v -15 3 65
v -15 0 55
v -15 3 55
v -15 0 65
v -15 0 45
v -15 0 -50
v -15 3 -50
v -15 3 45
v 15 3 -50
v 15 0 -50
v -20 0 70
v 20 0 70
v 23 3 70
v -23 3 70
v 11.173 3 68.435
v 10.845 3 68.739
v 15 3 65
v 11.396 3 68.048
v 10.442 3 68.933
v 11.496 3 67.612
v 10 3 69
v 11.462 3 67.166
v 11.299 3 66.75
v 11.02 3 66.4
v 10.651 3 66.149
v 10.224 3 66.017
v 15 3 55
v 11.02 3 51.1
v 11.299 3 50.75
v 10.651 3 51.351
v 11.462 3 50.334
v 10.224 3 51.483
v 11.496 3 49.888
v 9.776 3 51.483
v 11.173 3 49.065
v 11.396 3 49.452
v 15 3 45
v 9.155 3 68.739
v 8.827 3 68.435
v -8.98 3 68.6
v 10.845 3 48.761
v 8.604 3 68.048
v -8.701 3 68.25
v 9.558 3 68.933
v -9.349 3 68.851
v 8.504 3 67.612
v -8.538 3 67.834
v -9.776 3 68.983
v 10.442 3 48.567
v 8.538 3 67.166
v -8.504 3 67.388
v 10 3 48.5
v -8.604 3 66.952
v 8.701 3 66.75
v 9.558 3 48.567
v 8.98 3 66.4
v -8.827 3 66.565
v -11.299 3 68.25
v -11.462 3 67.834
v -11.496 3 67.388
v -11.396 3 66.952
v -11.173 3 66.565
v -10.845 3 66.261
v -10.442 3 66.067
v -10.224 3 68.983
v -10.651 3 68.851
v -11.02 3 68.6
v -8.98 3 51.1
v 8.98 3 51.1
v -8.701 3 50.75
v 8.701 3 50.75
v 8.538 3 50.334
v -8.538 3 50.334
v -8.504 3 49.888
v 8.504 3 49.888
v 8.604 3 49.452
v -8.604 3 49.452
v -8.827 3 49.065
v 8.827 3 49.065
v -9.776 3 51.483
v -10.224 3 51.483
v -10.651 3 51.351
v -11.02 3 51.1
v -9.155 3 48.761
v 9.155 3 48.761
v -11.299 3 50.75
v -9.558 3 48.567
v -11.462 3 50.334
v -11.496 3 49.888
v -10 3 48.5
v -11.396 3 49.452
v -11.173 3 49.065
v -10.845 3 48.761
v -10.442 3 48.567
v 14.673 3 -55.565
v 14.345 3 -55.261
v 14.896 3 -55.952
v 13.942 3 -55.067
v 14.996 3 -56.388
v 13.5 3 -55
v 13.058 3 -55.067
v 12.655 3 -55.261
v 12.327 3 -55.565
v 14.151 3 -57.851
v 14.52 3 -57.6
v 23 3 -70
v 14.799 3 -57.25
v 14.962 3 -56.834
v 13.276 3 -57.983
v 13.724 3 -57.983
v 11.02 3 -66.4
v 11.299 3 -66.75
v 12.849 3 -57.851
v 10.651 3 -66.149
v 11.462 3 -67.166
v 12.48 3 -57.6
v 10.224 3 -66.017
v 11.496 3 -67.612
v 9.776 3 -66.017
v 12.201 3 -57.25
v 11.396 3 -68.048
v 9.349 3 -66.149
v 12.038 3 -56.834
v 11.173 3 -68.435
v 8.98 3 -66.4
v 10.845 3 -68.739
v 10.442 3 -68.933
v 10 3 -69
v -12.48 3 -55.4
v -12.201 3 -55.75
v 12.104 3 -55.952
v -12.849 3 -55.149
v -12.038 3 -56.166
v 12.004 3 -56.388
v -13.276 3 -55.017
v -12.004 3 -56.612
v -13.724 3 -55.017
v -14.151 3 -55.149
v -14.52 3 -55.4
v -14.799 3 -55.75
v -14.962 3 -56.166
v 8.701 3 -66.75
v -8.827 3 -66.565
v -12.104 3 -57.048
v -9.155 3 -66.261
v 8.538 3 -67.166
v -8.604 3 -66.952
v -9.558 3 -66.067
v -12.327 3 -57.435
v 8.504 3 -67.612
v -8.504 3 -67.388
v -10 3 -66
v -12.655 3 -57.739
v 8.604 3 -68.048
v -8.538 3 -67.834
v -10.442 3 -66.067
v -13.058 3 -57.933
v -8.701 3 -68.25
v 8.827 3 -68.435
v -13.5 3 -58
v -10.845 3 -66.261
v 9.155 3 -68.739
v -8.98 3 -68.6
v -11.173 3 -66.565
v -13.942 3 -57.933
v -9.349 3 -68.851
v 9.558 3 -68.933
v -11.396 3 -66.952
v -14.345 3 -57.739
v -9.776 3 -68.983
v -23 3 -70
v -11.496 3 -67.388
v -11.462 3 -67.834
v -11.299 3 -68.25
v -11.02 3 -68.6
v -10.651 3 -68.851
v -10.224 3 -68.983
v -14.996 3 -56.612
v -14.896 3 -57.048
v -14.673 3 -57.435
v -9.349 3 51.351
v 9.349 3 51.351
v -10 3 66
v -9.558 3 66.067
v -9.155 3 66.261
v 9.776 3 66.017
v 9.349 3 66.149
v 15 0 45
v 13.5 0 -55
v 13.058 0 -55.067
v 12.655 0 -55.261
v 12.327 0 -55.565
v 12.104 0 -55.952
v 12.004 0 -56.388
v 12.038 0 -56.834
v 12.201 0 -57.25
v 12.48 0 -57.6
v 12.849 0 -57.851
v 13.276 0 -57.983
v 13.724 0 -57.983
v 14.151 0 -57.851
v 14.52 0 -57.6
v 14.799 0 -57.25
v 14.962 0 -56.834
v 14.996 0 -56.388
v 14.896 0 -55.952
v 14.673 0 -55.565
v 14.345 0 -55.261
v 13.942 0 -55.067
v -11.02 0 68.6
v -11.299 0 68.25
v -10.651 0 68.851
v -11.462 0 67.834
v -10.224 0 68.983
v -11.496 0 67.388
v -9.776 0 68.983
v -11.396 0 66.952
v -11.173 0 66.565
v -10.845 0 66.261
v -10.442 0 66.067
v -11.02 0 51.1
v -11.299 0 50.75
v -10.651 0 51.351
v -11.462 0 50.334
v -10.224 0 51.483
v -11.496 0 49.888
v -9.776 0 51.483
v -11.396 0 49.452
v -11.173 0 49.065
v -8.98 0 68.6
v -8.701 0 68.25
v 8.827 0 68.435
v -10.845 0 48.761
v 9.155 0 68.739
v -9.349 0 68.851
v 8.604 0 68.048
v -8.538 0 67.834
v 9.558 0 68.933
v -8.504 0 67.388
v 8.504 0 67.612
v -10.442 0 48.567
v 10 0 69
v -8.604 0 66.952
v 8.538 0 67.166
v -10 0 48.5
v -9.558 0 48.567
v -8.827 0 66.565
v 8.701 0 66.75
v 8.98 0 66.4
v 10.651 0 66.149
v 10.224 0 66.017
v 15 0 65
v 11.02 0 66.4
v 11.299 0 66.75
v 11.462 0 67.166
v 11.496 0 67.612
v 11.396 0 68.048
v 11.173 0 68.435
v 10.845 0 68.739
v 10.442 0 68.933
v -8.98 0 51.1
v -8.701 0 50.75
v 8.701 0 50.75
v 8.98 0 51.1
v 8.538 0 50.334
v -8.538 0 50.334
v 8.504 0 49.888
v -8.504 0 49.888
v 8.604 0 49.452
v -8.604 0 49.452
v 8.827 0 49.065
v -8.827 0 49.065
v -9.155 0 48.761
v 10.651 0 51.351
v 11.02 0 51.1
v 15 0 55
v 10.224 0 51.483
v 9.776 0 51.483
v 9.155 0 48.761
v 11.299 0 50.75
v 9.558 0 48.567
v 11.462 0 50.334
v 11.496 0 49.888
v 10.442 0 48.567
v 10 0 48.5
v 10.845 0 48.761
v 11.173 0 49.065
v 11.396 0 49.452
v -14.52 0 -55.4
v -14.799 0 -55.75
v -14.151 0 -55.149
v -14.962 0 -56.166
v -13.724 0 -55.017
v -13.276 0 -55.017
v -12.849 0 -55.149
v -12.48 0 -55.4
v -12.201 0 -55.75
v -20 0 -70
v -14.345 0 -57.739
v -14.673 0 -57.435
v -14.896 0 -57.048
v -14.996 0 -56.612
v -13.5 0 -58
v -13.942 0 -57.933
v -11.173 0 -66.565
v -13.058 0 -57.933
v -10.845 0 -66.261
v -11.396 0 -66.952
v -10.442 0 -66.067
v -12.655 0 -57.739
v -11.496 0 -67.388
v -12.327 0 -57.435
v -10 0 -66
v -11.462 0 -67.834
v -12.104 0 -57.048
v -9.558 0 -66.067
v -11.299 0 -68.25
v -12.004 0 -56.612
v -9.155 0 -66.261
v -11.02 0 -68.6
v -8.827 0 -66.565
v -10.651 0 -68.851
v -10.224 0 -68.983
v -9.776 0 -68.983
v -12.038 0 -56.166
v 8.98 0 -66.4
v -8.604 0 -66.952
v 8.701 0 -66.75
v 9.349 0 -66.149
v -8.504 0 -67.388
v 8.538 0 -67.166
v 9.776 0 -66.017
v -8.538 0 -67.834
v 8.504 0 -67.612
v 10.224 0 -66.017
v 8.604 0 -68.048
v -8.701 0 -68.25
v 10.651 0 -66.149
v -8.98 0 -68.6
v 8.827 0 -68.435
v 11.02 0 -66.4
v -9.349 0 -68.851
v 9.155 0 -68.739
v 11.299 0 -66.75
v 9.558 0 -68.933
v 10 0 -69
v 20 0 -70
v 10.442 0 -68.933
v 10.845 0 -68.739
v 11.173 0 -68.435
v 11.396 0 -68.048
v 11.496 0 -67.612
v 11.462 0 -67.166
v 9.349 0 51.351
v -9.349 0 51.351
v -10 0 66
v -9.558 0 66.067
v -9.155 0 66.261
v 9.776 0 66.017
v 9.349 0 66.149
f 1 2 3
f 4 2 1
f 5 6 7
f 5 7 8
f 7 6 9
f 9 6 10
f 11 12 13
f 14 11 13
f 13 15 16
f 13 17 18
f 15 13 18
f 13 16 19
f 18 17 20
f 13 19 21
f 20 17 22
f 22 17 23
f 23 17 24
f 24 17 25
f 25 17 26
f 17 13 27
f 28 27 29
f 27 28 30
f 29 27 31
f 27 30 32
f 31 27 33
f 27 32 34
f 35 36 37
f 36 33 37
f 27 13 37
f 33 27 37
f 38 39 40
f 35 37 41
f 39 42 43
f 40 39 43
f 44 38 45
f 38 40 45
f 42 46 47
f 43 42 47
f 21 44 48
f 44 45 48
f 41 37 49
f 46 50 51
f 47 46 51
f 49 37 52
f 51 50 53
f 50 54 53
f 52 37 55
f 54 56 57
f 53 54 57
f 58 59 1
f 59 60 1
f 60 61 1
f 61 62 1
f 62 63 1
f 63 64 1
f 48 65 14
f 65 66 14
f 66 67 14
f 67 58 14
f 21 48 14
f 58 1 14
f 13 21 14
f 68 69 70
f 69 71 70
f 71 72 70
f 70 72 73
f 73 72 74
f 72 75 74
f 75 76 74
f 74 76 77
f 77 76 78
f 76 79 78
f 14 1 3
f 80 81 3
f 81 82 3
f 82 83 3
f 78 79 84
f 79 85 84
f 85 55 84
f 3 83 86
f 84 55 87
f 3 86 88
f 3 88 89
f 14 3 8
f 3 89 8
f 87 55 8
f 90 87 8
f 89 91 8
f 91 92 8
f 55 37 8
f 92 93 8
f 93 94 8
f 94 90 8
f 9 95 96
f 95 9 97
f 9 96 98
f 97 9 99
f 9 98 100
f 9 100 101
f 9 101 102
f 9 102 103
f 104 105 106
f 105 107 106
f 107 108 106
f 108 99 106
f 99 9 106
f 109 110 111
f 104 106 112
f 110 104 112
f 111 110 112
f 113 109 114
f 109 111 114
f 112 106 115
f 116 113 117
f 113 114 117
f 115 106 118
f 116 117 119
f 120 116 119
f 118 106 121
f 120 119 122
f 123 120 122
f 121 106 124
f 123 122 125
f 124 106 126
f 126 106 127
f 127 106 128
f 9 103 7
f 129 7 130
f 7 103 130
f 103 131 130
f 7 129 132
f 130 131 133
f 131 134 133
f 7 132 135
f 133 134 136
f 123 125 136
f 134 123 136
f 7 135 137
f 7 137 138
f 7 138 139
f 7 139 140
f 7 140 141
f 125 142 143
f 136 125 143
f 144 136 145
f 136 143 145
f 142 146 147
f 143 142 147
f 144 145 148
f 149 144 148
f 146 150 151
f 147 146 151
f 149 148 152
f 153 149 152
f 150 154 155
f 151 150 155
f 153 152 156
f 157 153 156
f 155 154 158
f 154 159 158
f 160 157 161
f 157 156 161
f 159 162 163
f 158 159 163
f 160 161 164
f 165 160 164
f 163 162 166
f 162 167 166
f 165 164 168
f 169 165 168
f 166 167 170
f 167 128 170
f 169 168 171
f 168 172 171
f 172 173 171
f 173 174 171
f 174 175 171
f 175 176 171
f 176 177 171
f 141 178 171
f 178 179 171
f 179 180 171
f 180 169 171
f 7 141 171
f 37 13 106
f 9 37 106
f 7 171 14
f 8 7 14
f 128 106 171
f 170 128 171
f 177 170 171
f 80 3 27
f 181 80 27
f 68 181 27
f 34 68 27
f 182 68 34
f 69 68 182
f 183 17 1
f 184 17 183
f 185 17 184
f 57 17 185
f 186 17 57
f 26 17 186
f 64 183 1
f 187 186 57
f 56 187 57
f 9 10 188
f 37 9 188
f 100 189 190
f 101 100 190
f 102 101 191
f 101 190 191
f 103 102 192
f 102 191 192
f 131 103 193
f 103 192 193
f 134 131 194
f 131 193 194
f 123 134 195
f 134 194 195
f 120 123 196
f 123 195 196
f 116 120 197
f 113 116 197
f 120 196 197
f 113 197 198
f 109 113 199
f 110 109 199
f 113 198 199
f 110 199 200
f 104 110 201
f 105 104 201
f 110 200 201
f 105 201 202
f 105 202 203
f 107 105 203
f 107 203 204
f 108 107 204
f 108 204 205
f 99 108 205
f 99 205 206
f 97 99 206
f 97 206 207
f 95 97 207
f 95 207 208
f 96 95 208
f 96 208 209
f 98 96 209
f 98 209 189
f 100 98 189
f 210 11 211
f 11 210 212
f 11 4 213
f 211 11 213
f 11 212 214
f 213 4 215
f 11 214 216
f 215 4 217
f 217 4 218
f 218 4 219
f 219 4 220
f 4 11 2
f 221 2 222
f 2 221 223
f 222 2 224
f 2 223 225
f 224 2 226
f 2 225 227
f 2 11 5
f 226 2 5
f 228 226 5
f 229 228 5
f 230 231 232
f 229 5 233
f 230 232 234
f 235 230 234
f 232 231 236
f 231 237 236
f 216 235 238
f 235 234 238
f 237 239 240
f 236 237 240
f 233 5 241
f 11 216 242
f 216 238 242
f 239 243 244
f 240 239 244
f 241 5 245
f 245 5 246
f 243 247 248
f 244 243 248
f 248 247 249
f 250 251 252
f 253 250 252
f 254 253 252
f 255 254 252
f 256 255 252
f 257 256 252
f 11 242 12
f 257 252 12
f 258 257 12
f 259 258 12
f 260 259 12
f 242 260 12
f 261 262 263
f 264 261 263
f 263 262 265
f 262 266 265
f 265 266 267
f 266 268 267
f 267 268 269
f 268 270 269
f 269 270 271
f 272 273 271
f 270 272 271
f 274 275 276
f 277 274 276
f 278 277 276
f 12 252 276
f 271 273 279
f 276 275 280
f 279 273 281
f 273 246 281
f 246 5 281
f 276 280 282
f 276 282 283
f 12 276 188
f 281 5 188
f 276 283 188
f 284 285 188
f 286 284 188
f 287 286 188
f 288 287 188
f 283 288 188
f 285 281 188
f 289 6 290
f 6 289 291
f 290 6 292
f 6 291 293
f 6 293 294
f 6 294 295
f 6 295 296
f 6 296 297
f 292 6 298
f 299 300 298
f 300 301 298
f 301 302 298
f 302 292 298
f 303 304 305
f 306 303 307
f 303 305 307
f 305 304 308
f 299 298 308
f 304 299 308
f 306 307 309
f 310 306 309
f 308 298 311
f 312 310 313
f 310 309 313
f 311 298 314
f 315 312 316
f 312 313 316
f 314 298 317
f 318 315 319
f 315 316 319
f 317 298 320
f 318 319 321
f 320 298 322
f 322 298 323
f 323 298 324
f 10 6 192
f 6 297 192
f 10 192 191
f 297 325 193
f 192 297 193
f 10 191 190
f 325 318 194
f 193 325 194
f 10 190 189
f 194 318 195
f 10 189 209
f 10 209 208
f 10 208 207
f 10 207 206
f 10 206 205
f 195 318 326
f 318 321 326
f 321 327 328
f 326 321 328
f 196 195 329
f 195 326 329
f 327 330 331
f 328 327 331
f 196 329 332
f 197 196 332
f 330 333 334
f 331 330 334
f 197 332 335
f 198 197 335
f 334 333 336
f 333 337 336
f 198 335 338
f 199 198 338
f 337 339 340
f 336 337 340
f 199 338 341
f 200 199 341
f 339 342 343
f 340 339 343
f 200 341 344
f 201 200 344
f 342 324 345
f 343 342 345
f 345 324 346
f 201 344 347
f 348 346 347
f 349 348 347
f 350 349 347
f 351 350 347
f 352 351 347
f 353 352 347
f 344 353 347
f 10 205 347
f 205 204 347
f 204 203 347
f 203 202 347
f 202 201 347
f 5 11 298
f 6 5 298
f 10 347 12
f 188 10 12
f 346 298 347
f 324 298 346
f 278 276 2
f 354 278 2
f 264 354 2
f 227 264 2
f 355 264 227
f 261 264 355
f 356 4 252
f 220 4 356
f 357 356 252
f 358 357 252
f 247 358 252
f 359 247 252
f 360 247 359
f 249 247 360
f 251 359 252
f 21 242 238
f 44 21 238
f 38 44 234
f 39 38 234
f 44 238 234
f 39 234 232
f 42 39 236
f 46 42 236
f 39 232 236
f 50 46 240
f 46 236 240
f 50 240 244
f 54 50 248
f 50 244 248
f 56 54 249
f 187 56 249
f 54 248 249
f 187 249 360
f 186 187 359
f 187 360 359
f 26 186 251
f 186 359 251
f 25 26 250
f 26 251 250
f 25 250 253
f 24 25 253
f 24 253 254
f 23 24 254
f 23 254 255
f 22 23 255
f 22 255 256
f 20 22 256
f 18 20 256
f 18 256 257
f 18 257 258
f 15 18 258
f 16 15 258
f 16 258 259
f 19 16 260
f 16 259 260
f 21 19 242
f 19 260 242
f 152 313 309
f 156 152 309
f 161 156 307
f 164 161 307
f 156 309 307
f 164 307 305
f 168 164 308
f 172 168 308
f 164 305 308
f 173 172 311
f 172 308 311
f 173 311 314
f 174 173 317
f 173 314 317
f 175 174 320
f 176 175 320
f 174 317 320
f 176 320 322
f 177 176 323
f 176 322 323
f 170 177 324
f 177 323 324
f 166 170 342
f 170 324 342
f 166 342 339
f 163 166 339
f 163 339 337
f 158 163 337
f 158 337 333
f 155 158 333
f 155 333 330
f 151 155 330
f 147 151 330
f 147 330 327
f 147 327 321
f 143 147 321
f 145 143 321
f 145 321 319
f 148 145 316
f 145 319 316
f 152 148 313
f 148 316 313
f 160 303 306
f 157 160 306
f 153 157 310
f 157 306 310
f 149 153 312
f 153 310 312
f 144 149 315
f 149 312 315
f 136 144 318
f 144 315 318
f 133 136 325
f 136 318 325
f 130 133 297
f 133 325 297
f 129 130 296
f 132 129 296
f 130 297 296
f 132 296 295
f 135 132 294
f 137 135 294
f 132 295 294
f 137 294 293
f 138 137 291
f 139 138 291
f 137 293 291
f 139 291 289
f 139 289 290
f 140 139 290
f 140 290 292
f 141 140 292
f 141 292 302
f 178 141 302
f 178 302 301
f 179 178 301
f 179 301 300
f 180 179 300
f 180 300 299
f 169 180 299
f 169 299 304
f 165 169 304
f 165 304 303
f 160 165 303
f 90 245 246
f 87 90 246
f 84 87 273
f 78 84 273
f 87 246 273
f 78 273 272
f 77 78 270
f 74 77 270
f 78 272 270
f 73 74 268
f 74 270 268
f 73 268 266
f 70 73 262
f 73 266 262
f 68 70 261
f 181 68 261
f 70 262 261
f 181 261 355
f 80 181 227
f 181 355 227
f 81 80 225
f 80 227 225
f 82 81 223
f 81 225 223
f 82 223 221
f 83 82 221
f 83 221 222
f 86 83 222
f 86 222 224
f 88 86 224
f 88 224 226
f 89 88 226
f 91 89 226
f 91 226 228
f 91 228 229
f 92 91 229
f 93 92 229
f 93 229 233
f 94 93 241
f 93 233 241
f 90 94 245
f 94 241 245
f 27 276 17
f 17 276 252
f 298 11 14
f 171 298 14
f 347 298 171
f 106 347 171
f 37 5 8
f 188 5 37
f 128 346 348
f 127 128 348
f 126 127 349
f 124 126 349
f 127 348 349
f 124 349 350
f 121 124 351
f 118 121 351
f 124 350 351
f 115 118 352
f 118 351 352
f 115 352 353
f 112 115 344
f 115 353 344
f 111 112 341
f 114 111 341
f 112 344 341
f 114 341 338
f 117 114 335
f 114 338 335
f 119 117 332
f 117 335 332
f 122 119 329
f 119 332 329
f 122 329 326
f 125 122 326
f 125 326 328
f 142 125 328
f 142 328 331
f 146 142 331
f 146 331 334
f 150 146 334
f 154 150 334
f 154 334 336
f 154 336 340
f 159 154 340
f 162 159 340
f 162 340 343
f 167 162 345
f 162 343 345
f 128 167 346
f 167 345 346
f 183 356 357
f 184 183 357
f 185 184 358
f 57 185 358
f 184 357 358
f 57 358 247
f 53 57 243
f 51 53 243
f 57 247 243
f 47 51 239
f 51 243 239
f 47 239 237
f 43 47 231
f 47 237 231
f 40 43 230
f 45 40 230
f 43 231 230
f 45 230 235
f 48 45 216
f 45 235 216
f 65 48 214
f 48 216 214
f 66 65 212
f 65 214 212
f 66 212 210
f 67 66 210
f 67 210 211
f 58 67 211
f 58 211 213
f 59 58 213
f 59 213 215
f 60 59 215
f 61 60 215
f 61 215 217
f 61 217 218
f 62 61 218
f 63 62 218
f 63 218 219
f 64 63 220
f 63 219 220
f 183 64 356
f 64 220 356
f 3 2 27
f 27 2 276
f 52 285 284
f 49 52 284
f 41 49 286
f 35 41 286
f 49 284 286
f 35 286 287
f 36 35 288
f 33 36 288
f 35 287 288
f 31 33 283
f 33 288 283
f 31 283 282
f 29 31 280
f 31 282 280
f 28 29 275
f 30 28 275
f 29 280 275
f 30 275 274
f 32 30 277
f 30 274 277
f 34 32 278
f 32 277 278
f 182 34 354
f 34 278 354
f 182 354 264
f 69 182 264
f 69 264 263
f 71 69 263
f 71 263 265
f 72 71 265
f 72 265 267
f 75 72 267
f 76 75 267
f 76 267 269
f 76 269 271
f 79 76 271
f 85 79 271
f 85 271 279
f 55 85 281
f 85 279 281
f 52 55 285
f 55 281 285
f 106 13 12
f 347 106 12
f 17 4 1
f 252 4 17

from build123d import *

# Parameters (mm, degrees)
SKETCH1_W           = 50
SKETCH1_H           = 140
BOSS_EXTRUDE2_DEPTH = 5
CUT_EXTRUDE1_DEPTH  = 152
SKETCH7_W           = 50
SKETCH7_H           = 2
CUT_EXTRUDE5_DEPTH  = 197
SKETCH8_W           = 30
SKETCH8_H           = 130
CUT_EXTRUDE6_DEPTH  = 197
SKETCH9_W           = 40
SKETCH9_H           = 20
SKETCH9_R           = 1.5
BOSS_EXTRUDE5_DEPTH = 3
SKETCH10_W          = 30
SKETCH10_H          = 10
SKETCH10_R          = 1.5
BOSS_EXTRUDE6_DEPTH = 3
SKETCH11_R          = 1.5
CUT_EXTRUDE7_DEPTH  = 3


with BuildPart() as part:
    # Sketch1 → Boss-Extrude2 (new body)
    with BuildSketch(Plane(origin=(0, 0, 0), x_dir=(1, 0, 0), z_dir=(0, 1, 0))):
        Rectangle(SKETCH1_W, SKETCH1_H)
    extrude(amount=BOSS_EXTRUDE2_DEPTH)

    # Sketch2 → Cut-Extrude1 (cut)
    with BuildSketch(Plane.XY.offset(70)):
        Polygon((-20, 0), (-25, 5), (-25, 0), align=None)
        Polygon((25, 5), (20, 0), (25, 0), align=None)
    extrude(amount=-CUT_EXTRUDE1_DEPTH, mode=Mode.SUBTRACT)

    # Sketch7 → Cut-Extrude5 (cut)
    with BuildSketch(Plane(origin=(0, 0, -70), x_dir=(-1, 0, 0), z_dir=(0, 0, -1))):
        with Locations((0, 4)):
            Rectangle(SKETCH7_W, SKETCH7_H)
    extrude(amount=-CUT_EXTRUDE5_DEPTH, mode=Mode.SUBTRACT)

    # Sketch8 → Cut-Extrude6 (cut)
    with BuildSketch(Plane.XZ):
        Rectangle(SKETCH8_W, SKETCH8_H)
    extrude(amount=-CUT_EXTRUDE6_DEPTH, mode=Mode.SUBTRACT)

    # Sketch9 → Boss-Extrude5 (add)
    with BuildSketch(Plane.XZ):
        with Locations((0, -60)):
            Rectangle(SKETCH9_W, SKETCH9_H)
        with Locations(Location((-13.5, -56.5, 0), (0, 0, 270))):
            Circle(SKETCH9_R, mode=Mode.SUBTRACT)
        with Locations(Location((13.5, -56.5, 0), (0, 0, 90))):
            Circle(SKETCH9_R, mode=Mode.SUBTRACT)
    extrude(amount=-BOSS_EXTRUDE5_DEPTH)

    # Sketch10 → Boss-Extrude6 (add)
    with BuildSketch(Plane.XZ):
        with Locations((0, 50)):
            Rectangle(SKETCH10_W, SKETCH10_H)
        with Locations(Location((-10, 50, 0), (0, 0, 270))):
            Circle(SKETCH10_R, mode=Mode.SUBTRACT)
        with Locations(Location((10, 50, 0), (0, 0, 270))):
            Circle(SKETCH10_R, mode=Mode.SUBTRACT)
    extrude(amount=-BOSS_EXTRUDE6_DEPTH)

    # Sketch11 → Cut-Extrude7 (cut)
    with BuildSketch(Plane.XZ):
        with Locations(Location((-10, 67.5, 0), (0, 0, 270))):
            Circle(SKETCH11_R)
        with Locations(Location((10, 67.5, 0), (0, 0, 90))):
            Circle(SKETCH11_R)
        with Locations(Location((10, -67.5, 0), (0, 0, 270))):
            Circle(SKETCH11_R)
        with Locations(Location((-10, -67.5, 0), (0, 0, 90))):
            Circle(SKETCH11_R)
    extrude(amount=-CUT_EXTRUDE7_DEPTH, mode=Mode.SUBTRACT)


solid = part.part
